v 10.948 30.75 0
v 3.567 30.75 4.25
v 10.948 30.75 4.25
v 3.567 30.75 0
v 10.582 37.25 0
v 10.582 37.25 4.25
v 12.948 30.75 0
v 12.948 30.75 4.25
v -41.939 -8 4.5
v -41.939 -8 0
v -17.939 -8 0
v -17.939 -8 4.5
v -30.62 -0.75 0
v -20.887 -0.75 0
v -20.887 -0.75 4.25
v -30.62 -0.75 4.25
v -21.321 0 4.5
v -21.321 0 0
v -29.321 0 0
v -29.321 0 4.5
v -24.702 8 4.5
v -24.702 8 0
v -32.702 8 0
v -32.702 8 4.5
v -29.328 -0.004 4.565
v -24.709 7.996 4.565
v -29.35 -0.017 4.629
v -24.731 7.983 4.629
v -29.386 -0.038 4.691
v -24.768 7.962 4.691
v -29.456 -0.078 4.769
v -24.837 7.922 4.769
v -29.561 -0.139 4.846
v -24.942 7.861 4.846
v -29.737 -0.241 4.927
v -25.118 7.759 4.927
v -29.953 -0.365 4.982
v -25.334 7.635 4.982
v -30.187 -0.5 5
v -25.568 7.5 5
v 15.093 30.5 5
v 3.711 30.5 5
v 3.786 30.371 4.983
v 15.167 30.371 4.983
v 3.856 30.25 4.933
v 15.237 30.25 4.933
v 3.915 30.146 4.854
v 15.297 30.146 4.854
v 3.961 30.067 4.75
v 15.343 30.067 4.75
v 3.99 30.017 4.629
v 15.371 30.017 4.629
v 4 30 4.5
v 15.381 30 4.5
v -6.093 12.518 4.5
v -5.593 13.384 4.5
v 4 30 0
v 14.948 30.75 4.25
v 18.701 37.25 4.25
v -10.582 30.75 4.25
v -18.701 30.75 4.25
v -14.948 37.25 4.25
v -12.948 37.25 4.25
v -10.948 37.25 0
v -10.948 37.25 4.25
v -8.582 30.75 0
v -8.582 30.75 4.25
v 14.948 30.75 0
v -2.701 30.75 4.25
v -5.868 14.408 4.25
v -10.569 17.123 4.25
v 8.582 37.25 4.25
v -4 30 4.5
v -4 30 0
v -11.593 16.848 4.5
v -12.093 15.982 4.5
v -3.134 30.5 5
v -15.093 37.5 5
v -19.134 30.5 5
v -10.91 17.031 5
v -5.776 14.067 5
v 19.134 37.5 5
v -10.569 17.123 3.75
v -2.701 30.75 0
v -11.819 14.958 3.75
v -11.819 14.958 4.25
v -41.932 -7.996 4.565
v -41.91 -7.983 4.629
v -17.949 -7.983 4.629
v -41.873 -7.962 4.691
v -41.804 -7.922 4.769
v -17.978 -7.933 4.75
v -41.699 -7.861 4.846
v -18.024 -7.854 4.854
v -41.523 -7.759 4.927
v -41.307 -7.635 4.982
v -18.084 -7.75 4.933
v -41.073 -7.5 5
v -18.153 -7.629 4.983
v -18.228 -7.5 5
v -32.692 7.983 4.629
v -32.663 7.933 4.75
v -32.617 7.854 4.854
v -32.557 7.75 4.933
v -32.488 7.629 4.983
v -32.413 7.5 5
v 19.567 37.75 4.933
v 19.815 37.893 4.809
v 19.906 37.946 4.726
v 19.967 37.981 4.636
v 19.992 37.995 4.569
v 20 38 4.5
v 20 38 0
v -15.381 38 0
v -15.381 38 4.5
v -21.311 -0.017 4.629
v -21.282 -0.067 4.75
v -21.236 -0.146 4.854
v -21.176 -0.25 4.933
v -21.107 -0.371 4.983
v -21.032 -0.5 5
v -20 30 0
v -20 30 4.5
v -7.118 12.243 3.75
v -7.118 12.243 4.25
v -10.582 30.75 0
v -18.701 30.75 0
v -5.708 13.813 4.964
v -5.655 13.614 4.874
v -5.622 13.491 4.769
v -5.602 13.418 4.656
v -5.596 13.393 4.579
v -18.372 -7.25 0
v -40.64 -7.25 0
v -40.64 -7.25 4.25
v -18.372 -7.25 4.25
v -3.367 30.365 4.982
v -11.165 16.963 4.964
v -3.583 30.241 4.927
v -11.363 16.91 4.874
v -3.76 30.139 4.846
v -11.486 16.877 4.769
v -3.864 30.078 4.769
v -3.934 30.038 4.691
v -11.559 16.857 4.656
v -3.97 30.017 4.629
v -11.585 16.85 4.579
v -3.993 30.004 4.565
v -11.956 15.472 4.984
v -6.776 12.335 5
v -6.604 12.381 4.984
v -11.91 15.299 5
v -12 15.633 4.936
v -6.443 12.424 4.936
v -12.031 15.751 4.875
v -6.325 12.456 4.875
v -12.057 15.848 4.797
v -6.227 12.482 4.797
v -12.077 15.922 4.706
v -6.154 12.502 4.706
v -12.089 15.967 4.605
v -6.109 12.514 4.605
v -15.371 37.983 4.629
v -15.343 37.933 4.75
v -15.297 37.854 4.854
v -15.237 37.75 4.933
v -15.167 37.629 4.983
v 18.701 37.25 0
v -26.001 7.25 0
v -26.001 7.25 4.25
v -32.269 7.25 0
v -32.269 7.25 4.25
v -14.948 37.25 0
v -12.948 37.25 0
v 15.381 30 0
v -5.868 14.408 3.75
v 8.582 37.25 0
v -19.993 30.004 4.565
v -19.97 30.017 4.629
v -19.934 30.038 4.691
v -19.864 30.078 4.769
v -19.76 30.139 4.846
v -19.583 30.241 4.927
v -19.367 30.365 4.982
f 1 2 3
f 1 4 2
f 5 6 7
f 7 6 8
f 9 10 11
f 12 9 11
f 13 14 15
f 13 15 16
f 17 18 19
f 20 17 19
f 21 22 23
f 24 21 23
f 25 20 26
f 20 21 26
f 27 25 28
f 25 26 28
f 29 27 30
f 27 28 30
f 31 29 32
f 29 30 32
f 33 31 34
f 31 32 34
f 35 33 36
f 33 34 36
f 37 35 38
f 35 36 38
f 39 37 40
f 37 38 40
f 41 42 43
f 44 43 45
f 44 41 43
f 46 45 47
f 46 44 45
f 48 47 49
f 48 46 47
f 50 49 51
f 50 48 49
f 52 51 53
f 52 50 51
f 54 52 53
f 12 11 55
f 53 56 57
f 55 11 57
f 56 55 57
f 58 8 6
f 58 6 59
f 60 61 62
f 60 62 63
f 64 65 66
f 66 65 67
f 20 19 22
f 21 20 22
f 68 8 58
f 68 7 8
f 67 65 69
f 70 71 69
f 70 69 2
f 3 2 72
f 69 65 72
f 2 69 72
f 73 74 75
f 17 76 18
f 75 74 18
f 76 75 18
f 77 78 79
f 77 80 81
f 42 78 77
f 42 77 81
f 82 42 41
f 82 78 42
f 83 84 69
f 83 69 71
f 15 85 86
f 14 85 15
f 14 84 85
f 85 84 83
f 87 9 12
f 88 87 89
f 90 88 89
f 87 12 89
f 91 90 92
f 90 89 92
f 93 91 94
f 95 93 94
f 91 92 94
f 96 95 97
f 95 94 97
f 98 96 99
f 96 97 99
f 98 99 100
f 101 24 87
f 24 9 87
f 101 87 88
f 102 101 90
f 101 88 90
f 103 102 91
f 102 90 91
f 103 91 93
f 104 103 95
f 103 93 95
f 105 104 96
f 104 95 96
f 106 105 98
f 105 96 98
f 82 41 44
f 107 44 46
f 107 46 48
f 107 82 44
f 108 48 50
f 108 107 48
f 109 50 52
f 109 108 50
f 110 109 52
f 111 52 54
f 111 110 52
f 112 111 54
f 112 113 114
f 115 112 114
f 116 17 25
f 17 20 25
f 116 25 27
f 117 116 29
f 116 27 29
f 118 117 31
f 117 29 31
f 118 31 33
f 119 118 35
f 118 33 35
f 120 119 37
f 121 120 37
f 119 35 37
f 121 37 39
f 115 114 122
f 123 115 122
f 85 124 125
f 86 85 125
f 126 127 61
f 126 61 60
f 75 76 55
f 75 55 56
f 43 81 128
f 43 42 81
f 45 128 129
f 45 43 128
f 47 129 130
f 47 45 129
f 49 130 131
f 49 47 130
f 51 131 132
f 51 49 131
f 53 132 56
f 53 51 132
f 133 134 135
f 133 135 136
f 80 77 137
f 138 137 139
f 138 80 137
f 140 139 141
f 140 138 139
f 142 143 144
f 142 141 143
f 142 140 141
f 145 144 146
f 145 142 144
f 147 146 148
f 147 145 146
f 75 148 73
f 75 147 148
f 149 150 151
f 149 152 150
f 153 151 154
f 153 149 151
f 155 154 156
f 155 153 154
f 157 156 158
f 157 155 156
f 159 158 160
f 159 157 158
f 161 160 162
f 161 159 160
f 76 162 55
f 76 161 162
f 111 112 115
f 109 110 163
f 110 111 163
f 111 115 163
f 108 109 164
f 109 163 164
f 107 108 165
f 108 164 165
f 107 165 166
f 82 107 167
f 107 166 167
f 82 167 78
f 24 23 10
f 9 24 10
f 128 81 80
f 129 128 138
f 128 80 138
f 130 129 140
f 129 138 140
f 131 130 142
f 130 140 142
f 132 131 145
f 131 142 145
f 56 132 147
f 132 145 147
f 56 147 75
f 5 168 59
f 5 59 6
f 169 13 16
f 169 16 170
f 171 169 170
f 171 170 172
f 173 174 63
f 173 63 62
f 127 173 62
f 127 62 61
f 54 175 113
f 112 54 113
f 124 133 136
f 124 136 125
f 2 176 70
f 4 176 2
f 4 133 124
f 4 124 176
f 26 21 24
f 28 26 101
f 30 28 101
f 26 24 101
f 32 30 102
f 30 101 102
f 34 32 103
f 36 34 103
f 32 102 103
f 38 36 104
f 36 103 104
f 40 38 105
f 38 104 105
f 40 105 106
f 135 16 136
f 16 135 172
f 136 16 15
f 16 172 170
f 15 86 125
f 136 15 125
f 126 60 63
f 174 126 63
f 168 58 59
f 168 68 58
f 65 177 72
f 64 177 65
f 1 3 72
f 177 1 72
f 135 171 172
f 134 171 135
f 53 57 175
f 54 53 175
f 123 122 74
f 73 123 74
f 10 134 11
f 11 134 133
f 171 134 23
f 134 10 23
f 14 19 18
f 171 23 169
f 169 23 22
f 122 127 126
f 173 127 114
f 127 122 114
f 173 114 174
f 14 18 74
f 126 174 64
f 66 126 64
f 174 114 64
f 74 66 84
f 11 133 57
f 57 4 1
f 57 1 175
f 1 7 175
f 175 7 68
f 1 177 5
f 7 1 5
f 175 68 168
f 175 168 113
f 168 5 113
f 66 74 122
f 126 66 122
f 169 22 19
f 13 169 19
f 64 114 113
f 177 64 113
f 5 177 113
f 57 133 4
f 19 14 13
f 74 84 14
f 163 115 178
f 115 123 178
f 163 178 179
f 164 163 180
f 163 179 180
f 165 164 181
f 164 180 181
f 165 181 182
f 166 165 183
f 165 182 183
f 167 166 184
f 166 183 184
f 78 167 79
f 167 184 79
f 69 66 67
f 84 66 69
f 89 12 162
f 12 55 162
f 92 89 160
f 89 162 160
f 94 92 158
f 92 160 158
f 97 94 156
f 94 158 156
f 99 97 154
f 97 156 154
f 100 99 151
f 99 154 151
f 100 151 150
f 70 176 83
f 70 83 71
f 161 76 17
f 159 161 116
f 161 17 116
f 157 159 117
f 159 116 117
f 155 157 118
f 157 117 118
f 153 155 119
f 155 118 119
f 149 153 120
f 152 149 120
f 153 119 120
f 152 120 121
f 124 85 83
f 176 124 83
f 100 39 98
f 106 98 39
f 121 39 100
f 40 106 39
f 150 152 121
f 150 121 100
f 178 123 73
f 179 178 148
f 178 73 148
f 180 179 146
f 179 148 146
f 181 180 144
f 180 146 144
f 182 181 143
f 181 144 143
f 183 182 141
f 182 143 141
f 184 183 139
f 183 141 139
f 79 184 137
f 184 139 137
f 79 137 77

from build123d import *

# Parameters (mm, degrees)
F1_DEPTH = 5
F4_W     = 1
F4_H     = 5.3799478337
F5_DEPTH = 100
F6_T     = -0.75
F7_R     = 0.49999
F9_DEPTH = 4.25


# Not quite as in the source:
# - a fillet or chamfer is up to 0.001 mm smaller than in the source, because OpenCascade refuses the exact size


with BuildPart() as f1:
    # F0 (on Top) → F1 (new body)
    with BuildSketch(Plane.XY):
        Polygon((-15.3811978465, 38), (-20, 30), (-4, 30), (-21.3205080757, 0), (-29.3205080757, 0), (-24.7017059222, 8), (-32.7017059222, 8), (-41.9393102292, -8), (-17.9393102292, -8), (4, 30), (15.3811978465, 30), (20, 38), align=None)
    extrude(amount=F1_DEPTH)

    # F4 (on offset) → F5 (cut)
    with BuildSketch(Plane(origin=(11.6602540378, -6.7320508076, 0), x_dir=(0.5, 0.8660254038, 0), z_dir=(0.8660254038, -0.5, 0))):
        with Locations((8.2942286341, 7.1899739169)):
            Rectangle(F4_W, F4_H)
    extrude(amount=-F5_DEPTH, mode=Mode.SUBTRACT)

    # F6
    f6_openings = [f1.faces().sort_by_distance(p)[0] for p in [
        (2.309401, 37.228477, 0),
    ]]
    offset(amount=F6_T, openings=f6_openings, kind=Kind.INTERSECTION)

    # F7 (radius 0.5 in the source; OpenCascade refuses exactly that, so slightly less here)
    f7_edges = [f1.edges().sort_by_distance(p)[0] for p in [
        (-0.796633, 21.691987, 5),
        (9.690599, 30, 5),
        (17.690599, 34, 5),
        (2.309401, 38, 5),
        (-17.690599, 34, 5),
        (-12, 30, 5),
        (-7.796633, 23.424038, 5),
        (-8.593267, 15.116025, 5),
        (-16.706887, 7.991025, 5),
        (-25.320508, 0, 5),
        (-27.011107, 4, 5),
        (-28.701706, 8, 5),
        (-37.320508, 0, 5),
        (-29.93931, -8, 5),
        (-12.016288, 2.258975, 5),
        (-9.093267, 14.25, 5),
    ]]
    fillet(f7_edges, radius=F7_R)

    # F8 (on face) → F9 (join, through all)
    with BuildSketch(Plane(origin=(0, 0, 4.25), x_dir=(1, 0, 0), z_dir=(0, 0, -1))):
        Polygon((-10.5823786219, -30.75), (-12.9481851446, -37.25), (-10.9481851446, -37.25), (-8.5823786219, -30.75), align=None)
        Polygon((10.9481851446, -30.75), (8.5823786219, -37.25), (10.5823786219, -37.25), (12.9481851446, -30.75), align=None)
    extrude(amount=F9_DEPTH)


solid = f1.part
